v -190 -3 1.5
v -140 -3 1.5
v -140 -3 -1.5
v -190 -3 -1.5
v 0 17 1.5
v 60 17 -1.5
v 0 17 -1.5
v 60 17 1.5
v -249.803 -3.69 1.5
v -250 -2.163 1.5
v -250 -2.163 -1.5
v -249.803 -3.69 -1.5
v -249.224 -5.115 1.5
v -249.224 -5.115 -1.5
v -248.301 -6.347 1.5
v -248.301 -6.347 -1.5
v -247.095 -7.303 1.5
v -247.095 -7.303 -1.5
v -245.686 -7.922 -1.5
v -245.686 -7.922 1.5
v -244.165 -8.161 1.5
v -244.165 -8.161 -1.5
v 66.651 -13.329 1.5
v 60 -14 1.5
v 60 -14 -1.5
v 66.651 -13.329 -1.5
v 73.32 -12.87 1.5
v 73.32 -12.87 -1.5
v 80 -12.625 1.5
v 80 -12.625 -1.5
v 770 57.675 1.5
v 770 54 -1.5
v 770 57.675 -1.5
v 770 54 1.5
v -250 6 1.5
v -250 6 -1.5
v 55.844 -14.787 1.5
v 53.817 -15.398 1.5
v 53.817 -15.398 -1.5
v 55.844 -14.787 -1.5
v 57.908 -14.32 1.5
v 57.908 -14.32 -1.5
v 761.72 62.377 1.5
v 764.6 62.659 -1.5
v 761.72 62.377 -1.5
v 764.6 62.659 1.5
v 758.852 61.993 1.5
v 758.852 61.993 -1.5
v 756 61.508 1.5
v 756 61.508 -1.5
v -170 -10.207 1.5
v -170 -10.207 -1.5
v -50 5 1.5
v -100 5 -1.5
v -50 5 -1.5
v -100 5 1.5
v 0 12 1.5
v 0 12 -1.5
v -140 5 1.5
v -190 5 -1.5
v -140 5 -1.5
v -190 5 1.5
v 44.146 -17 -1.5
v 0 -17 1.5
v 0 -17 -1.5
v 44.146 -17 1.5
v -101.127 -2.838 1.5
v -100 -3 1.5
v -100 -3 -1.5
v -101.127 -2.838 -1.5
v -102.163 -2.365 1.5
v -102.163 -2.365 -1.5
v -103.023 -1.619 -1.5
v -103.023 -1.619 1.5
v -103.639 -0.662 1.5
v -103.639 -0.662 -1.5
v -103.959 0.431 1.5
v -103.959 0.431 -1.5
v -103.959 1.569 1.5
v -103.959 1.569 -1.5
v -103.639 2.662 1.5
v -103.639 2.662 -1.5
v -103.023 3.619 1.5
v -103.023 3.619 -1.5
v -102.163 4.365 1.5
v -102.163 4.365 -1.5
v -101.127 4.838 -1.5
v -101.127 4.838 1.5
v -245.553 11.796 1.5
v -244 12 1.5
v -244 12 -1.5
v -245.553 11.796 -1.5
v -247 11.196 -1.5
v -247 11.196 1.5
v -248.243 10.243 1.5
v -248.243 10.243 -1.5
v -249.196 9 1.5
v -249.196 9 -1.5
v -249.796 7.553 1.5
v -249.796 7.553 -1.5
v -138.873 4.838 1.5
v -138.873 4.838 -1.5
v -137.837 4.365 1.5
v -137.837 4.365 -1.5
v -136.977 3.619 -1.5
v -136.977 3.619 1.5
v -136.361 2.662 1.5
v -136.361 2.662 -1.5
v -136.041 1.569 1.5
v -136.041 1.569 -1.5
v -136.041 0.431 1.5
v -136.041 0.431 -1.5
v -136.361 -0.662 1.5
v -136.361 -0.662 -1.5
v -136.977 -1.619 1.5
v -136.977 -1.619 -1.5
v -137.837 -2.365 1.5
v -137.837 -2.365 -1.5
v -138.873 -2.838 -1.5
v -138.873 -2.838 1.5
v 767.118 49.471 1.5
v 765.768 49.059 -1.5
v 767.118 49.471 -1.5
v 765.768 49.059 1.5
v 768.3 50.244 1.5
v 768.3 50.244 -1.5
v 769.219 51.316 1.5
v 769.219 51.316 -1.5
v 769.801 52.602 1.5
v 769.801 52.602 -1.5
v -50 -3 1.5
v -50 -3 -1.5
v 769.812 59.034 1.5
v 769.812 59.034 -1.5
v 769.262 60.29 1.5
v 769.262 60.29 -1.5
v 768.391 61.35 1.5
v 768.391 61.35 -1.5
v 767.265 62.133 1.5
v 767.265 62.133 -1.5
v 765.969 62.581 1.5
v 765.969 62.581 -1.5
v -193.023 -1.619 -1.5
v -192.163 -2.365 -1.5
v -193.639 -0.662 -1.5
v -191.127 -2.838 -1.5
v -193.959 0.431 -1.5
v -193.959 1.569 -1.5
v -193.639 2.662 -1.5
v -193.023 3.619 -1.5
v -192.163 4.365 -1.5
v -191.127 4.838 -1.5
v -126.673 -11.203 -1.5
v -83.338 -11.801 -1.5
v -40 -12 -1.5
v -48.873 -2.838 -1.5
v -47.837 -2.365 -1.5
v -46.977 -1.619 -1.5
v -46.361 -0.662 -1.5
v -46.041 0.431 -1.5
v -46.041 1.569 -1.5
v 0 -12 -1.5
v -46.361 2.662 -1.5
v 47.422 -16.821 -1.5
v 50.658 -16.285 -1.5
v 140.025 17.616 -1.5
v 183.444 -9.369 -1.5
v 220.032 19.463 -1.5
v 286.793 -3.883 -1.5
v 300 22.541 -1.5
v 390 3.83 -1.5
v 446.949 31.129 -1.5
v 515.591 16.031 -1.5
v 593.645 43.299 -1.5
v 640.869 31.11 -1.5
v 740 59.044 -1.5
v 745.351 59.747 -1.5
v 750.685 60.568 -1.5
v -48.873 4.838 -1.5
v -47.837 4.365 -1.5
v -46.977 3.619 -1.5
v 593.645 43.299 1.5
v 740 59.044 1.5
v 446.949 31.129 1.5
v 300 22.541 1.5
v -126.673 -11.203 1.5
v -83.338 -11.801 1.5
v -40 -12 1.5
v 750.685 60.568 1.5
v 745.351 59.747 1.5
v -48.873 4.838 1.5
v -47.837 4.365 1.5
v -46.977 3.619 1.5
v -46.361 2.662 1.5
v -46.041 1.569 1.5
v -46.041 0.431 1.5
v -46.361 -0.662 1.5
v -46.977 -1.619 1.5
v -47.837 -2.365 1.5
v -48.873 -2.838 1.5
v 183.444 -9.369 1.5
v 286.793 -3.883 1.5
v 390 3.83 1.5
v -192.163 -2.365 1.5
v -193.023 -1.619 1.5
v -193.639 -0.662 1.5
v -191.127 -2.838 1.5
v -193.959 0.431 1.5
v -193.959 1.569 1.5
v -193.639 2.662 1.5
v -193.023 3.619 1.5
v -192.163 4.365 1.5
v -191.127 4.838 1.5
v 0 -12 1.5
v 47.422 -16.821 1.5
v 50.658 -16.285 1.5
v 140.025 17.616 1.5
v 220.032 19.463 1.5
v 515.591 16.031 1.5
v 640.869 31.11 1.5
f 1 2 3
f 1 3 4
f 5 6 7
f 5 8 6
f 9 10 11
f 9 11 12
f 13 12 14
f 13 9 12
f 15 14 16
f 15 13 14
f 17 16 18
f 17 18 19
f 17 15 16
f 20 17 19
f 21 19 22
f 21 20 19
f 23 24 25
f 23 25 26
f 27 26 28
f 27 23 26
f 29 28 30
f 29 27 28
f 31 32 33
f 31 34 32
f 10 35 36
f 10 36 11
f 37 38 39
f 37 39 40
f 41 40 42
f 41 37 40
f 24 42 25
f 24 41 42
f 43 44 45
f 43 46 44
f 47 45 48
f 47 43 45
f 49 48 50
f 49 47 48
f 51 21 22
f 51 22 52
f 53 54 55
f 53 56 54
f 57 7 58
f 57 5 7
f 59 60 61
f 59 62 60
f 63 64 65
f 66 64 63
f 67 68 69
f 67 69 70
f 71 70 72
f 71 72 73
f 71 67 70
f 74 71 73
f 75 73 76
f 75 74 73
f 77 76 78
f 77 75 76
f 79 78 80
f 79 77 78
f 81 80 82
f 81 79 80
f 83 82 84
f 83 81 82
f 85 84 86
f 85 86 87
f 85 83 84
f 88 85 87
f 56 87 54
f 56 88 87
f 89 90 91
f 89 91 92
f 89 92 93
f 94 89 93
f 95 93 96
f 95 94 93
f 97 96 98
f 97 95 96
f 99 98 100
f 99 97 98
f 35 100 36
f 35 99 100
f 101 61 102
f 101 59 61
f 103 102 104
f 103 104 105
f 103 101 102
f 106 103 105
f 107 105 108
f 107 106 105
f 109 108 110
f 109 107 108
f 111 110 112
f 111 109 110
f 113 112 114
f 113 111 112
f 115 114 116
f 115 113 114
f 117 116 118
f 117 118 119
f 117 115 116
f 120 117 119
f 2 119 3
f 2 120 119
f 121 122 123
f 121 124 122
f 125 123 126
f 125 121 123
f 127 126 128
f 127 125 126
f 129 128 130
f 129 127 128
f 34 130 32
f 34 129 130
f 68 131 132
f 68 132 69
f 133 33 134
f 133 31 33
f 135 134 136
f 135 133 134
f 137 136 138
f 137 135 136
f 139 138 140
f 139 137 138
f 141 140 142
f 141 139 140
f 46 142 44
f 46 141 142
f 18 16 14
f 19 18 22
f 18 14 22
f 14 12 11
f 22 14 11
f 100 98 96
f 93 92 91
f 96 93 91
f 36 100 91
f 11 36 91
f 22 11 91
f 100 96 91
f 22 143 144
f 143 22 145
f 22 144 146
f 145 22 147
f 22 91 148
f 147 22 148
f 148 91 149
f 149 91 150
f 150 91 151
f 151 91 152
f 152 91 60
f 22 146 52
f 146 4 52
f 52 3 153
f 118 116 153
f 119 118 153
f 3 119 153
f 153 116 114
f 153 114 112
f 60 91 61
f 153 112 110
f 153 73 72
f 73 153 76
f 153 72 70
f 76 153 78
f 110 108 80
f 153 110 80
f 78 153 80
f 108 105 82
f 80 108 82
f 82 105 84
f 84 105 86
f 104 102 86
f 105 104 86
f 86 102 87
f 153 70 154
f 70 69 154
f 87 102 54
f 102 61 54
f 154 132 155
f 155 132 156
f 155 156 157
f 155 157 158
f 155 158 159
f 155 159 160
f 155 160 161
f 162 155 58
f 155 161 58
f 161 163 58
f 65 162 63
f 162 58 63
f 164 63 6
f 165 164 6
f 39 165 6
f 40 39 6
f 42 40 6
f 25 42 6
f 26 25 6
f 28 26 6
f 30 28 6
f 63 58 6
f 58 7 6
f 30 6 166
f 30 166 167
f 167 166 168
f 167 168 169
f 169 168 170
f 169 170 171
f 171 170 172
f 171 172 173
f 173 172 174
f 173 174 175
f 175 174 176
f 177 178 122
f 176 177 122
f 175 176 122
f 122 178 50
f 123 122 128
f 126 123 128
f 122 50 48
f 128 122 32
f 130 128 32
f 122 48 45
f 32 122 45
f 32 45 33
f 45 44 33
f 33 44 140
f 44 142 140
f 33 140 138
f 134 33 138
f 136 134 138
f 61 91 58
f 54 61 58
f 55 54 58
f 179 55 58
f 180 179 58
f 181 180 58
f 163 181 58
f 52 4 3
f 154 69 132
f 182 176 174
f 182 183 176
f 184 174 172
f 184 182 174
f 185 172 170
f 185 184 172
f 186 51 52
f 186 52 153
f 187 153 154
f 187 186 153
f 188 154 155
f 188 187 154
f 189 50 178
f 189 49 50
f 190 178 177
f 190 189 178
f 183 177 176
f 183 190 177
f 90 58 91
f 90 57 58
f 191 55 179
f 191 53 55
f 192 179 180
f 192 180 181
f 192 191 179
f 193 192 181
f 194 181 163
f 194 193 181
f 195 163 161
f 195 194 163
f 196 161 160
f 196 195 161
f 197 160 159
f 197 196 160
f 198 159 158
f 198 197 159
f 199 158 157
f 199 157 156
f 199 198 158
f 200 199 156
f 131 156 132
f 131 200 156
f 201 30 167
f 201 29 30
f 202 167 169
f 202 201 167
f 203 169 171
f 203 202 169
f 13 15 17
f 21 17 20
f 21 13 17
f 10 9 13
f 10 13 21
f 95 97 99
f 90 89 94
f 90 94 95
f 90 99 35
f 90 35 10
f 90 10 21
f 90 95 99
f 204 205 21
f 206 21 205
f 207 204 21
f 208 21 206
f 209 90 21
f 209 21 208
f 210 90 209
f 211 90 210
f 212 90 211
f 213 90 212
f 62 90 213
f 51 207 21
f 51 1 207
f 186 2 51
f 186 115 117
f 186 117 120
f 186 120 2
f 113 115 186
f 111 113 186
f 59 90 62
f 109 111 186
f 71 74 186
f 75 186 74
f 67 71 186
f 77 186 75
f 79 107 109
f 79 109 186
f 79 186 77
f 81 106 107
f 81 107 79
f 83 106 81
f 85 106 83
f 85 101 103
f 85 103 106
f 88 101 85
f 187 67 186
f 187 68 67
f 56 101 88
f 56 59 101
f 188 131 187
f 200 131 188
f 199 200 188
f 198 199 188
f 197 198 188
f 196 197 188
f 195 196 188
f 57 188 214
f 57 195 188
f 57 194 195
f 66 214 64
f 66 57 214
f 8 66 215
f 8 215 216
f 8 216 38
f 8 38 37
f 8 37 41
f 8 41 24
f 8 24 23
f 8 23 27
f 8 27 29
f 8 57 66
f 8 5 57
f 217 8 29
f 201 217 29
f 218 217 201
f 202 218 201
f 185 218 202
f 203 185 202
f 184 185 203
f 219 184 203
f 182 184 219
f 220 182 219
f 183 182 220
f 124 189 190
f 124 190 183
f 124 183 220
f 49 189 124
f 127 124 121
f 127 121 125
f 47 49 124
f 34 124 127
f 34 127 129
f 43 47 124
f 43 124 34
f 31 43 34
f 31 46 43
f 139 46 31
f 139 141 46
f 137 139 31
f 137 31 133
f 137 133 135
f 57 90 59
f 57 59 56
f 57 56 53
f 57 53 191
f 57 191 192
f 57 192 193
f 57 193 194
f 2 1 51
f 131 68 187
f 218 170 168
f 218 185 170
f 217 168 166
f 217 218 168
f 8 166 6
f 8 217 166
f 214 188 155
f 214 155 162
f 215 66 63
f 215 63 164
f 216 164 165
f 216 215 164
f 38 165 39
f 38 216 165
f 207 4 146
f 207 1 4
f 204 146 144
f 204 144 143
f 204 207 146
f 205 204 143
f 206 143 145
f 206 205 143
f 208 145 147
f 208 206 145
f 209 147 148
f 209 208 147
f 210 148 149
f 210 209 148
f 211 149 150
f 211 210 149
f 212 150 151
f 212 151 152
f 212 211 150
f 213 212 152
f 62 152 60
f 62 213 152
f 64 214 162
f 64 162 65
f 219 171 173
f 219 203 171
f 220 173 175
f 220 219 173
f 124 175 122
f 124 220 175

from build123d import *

# Parameters (mm, degrees)
EXTRUDE_1_DEPTH = 1.5


with BuildPart() as part:
    # 草图1 → 凸台-拉伸1 (new body, symmetric)
    with BuildSketch(Plane.XY):
        with BuildLine():
            Line((0, 12), (-244, 12))
            ThreePointArc((-244, 12), (-248.242640687, 10.242640687), (-250, 6))
            Line((-250, 6), (-250, -2.163248404))
            ThreePointArc((-250, -2.163248404), (-248.300744725, -6.346978177), (-244.165468396, -8.160966321))
            Line((-244.165468396, -8.160966321), (-170, -10.207084742))
            ThreePointArc((-170, -10.207084742), (-105.006181524, -11.551749873), (-40, -12))
            Line((-40, -12), (0, -12))
            Line((0, -12), (0, -17))
            Line((0, -17), (44.145576966, -17))
            ThreePointArc((44.145576966, -17), (49.047286744, -16.596845123), (53.817253308, -15.398216084))
            ThreePointArc((53.817253308, -15.398216084), (56.87159336, -14.535351182), (60, -14))
            ThreePointArc((60, -14), (69.983522822, -13.072941186), (80, -12.625335423))
            ThreePointArc((80, -12.625335423), (235.133064328, -6.904453143), (390, 3.82999502))
            ThreePointArc((390, 3.82999502), (578.273151109, 23.21141529), (765.76796239, 49.059328612))
            ThreePointArc((765.76796239, 49.059328612), (768.797355129, 50.747294353), (770, 54))
            Line((770, 54), (770, 57.675354294))
            ThreePointArc((770, 57.675354294), (768.391164992, 61.349588908), (764.6, 62.659328612))
            ThreePointArc((764.6, 62.659328612), (760.284727379, 62.197558708), (756, 61.507688779))
            ThreePointArc((756, 61.507688779), (748.020565474, 60.142412099), (740, 59.044284039))
            ThreePointArc((740, 59.044284039), (520.334050184, 36.766259367), (300, 22.541414161))
            ThreePointArc((300, 22.541414161), (180.031982479, 18.385538128), (60, 17))
            Line((60, 17), (0, 17))
            Line((0, 17), (0, 12))
        make_face()
        with BuildLine():
            Line((-50, -3), (-100, -3))
            ThreePointArc((-100, -3), (-104, 1), (-100, 5))
            Line((-100, 5), (-50, 5))
            ThreePointArc((-50, 5), (-46, 1), (-50, -3))
        make_face(mode=Mode.SUBTRACT)
        with BuildLine():
            Line((-140, -3), (-190, -3))
            ThreePointArc((-190, -3), (-194, 1), (-190, 5))
            Line((-190, 5), (-140, 5))
            ThreePointArc((-140, 5), (-136, 1), (-140, -3))
        make_face(mode=Mode.SUBTRACT)
    extrude(amount=EXTRUDE_1_DEPTH, both=True)


solid = part.part
